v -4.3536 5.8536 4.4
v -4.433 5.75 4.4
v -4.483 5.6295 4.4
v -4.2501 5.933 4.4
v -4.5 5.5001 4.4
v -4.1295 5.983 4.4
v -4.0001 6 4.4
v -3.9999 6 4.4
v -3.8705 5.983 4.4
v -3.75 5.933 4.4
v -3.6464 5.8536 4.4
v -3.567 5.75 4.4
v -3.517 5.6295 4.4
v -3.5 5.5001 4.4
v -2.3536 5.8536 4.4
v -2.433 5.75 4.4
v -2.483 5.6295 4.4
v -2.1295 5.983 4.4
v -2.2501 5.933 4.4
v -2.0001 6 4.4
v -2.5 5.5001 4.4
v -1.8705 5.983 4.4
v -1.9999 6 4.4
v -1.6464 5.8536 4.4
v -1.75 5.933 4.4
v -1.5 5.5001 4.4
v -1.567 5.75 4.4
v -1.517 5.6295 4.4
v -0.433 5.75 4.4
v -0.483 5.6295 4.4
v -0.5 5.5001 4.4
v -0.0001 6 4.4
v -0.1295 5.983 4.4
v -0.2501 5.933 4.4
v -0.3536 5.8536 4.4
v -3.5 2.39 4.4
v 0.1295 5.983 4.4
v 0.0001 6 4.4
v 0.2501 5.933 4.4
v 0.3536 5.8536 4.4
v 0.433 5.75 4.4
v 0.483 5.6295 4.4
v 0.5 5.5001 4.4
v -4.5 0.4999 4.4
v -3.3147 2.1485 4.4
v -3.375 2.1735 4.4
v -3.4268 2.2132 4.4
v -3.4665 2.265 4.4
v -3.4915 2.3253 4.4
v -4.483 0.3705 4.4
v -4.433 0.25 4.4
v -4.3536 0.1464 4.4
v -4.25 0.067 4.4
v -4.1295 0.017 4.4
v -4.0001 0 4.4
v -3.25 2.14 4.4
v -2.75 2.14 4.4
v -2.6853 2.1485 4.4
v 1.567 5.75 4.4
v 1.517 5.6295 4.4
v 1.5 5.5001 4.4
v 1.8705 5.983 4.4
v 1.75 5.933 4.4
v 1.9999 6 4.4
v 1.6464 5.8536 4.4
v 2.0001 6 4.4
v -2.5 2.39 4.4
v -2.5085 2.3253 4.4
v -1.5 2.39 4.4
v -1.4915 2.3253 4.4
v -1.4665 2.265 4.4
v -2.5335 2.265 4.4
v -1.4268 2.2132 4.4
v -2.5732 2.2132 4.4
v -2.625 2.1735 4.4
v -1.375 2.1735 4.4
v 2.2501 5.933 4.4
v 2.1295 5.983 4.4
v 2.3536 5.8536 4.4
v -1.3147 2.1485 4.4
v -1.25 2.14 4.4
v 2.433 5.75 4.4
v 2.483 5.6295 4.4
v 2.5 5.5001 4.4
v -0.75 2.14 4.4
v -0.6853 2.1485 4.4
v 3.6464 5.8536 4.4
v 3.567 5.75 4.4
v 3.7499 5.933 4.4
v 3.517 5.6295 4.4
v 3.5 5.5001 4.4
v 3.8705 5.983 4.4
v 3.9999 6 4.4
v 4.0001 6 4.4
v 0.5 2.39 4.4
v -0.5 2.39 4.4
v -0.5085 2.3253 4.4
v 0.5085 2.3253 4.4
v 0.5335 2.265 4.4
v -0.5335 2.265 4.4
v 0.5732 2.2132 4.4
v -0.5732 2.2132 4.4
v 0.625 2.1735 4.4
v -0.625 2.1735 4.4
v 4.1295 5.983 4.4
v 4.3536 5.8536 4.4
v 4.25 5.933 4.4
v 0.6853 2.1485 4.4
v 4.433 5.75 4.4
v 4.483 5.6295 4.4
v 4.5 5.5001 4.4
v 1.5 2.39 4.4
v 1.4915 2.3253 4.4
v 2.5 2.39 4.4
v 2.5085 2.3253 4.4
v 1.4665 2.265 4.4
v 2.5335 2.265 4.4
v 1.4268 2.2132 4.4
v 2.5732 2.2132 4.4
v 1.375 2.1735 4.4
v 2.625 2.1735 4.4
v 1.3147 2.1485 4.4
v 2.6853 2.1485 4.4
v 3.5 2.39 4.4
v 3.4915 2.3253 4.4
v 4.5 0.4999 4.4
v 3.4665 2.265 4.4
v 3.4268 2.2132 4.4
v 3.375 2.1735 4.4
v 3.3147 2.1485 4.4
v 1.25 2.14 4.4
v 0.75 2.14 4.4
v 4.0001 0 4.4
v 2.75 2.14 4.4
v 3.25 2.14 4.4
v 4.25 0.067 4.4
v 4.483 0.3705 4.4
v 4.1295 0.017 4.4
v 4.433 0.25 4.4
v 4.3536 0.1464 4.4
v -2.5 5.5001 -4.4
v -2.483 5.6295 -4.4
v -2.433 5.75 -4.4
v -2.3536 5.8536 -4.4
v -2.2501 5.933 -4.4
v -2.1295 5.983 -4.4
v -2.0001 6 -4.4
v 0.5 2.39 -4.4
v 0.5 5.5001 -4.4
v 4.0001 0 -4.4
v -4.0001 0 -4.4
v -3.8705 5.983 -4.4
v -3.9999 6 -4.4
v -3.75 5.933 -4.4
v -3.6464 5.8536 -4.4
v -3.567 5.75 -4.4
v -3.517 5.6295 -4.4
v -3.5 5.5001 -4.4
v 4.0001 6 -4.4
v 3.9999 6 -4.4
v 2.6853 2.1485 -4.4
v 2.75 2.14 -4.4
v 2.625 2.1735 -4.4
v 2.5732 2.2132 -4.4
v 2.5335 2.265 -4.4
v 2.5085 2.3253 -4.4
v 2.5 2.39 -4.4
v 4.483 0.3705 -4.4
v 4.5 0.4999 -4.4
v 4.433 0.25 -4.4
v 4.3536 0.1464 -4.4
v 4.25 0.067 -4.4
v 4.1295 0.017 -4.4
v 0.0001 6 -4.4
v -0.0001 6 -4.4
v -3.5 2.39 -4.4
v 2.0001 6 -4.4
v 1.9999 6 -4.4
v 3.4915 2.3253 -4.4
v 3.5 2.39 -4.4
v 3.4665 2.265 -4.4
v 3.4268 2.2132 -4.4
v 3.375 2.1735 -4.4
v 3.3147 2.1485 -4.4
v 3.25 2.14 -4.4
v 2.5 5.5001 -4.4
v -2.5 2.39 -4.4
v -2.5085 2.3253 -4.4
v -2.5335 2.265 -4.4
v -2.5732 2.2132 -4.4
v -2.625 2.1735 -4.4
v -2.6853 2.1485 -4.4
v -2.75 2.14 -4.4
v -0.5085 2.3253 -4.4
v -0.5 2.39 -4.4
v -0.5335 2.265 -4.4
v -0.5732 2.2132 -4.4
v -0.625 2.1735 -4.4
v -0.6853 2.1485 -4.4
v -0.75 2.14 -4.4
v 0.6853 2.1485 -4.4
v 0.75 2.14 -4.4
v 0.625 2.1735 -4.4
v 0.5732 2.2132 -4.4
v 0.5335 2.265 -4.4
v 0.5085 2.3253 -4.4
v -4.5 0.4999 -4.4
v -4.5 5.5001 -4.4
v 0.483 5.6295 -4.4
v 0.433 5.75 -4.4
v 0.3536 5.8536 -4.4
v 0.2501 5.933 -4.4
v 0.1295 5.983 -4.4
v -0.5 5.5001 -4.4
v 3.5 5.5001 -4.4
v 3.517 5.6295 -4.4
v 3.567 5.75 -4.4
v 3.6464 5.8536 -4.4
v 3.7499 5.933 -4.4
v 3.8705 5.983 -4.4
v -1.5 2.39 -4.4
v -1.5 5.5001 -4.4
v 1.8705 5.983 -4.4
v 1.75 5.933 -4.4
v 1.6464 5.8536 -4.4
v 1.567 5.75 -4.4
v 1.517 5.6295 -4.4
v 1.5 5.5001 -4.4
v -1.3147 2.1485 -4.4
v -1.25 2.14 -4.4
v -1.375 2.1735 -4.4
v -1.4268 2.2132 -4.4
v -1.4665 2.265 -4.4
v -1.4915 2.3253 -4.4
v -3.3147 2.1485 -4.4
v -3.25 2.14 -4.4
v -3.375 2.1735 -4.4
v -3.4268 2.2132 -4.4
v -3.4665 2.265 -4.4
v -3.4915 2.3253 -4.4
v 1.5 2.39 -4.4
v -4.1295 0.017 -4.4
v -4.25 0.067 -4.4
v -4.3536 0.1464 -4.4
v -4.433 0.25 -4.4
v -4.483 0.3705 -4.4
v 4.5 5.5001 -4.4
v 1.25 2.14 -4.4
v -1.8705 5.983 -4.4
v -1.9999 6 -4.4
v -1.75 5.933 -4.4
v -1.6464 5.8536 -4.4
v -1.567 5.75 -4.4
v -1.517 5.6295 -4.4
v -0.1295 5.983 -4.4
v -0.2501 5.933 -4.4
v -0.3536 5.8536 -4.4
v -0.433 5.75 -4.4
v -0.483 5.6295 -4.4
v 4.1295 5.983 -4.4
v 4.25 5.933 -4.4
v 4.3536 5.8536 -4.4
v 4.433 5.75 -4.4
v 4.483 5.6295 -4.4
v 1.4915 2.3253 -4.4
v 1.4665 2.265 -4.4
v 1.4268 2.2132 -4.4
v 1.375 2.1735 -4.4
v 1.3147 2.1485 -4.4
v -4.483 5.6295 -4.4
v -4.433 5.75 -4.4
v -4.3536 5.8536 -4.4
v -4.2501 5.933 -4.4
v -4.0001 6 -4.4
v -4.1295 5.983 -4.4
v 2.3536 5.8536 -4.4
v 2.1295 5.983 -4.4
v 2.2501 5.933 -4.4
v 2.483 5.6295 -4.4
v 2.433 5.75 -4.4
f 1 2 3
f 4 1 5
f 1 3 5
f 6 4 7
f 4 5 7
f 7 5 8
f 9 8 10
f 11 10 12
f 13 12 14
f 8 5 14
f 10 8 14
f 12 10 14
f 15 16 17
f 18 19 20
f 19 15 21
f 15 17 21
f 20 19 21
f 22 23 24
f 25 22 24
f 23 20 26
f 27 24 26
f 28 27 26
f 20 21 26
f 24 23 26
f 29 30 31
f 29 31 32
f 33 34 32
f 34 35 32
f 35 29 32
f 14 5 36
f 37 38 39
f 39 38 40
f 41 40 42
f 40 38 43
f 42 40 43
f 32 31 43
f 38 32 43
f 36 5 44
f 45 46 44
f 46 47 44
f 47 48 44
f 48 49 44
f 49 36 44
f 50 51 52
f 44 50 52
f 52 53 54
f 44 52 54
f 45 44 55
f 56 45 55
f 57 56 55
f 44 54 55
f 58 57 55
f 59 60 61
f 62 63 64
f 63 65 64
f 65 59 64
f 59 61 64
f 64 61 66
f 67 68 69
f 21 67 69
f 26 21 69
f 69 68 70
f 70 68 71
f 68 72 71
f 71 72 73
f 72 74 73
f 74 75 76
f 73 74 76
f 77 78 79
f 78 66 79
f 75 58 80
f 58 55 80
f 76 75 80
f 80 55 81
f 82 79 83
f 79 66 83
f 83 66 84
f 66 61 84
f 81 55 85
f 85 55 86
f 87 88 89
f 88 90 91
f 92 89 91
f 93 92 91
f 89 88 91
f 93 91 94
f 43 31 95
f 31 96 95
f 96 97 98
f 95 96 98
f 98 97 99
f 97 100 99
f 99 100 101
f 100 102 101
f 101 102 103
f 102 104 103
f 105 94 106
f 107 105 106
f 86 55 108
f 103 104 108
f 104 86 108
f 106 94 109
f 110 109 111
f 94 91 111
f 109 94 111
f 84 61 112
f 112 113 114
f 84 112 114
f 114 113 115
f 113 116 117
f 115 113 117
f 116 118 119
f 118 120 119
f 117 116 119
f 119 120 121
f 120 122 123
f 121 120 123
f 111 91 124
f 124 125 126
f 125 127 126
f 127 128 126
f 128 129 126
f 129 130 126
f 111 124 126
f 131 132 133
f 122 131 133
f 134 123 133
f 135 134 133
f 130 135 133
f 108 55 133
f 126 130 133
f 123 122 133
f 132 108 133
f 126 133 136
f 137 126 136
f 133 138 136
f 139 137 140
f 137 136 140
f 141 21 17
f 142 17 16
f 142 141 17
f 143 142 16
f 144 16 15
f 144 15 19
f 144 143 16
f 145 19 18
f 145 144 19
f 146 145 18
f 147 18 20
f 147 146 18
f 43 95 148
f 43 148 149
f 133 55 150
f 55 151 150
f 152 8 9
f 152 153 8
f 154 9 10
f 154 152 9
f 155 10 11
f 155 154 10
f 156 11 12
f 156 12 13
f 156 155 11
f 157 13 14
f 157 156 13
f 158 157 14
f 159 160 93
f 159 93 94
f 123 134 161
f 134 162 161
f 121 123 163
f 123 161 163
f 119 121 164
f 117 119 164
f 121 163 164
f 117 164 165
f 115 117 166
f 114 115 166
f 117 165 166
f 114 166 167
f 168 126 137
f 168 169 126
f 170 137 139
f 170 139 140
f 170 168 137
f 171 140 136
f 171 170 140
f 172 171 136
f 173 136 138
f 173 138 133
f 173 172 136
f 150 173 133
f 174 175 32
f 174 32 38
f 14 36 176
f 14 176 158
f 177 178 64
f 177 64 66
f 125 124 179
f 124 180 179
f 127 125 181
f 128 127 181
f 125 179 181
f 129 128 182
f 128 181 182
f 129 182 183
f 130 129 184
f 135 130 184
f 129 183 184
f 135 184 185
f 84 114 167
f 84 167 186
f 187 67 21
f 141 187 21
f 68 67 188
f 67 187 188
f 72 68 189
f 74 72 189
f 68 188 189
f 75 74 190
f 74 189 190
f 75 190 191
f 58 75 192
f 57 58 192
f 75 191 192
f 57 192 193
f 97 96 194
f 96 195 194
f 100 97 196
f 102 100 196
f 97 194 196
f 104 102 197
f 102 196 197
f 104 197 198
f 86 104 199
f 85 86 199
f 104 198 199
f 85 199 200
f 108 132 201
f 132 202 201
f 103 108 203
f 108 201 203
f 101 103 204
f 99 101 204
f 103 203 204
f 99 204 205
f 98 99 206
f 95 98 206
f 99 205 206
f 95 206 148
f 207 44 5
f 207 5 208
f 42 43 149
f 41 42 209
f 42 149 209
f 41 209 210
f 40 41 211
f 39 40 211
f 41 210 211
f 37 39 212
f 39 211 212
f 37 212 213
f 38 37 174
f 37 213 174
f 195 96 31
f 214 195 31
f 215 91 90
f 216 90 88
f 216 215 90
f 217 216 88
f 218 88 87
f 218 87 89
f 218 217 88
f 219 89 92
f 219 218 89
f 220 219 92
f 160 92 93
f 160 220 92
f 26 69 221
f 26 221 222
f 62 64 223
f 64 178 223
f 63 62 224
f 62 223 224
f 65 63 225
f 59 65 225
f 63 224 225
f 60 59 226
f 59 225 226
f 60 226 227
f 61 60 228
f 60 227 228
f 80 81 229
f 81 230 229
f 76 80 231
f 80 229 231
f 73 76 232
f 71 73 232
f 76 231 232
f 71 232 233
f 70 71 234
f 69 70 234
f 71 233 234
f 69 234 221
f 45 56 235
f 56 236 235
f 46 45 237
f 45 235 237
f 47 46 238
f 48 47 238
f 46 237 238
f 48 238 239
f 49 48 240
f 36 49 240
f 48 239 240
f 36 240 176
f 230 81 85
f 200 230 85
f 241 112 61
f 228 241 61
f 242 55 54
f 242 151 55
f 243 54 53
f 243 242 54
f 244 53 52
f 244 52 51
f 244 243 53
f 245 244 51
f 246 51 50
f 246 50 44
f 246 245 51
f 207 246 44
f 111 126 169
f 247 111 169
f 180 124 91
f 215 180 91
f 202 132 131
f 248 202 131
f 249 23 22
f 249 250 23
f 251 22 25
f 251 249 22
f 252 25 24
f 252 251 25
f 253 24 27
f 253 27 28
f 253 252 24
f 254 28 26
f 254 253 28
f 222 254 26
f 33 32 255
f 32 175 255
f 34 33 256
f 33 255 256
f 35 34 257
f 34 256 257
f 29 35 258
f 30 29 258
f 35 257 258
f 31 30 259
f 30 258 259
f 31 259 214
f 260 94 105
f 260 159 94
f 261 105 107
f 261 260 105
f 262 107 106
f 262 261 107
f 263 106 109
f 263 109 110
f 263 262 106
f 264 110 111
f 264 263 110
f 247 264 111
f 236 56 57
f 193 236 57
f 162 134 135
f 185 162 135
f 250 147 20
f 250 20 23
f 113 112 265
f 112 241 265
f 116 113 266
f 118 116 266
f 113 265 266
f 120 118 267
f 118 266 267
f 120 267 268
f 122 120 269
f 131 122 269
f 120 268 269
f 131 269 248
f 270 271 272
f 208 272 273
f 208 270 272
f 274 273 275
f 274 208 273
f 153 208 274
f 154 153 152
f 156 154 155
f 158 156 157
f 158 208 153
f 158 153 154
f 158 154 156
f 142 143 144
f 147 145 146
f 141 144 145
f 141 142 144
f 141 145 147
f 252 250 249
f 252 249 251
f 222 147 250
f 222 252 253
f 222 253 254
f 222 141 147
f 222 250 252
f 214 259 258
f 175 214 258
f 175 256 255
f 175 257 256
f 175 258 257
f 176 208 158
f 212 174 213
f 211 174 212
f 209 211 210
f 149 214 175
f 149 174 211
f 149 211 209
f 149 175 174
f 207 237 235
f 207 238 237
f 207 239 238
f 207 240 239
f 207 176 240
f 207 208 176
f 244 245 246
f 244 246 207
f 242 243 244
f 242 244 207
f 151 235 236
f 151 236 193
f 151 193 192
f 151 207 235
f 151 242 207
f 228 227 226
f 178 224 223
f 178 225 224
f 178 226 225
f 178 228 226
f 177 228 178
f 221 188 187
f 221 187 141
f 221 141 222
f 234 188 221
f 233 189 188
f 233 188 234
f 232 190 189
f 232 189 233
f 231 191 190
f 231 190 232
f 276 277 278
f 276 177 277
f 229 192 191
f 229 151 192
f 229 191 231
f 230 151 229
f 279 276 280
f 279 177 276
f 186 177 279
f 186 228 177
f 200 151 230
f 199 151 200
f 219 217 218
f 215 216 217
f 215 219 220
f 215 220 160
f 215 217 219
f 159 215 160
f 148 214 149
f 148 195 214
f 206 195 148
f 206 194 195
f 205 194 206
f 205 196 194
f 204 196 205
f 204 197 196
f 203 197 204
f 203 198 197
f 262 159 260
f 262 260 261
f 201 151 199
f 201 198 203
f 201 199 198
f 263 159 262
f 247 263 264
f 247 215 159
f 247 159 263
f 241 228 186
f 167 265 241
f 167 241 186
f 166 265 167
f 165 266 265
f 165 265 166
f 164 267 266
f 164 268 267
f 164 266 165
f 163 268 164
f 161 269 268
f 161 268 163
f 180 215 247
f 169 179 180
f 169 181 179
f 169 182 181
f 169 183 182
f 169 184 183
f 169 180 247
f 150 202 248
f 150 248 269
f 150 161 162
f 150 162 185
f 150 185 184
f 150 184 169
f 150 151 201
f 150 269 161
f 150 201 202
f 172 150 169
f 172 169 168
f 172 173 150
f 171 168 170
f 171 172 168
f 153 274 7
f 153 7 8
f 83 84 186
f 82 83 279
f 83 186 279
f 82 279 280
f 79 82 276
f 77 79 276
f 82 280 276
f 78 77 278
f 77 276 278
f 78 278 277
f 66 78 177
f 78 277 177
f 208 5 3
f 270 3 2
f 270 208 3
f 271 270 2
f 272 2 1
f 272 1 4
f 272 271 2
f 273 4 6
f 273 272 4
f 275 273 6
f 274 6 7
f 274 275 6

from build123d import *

# Parameters (mm, degrees)
SKETCH1_W           = 9
SKETCH1_H           = 8.8
BOSS_EXTRUDE1_DEPTH = 6
SKETCH2_W           = 1
SKETCH2_H           = 3.86
CUT_EXTRUDE1_DEPTH  = 12.562439189
LPATTERN1_COUNT     = 4
LPATTERN1_PITCH     = 2
FILLET1_R           = 0.25
FILLET2_R           = 0.5


with BuildPart() as part:
    # Sketch1 → Boss-Extrude1 (new body)
    with BuildSketch(Plane(origin=(0, 0, 0), x_dir=(1, 0, 0), z_dir=(0, 1, 0))):
        Rectangle(SKETCH1_W, SKETCH1_H)
    extrude(amount=BOSS_EXTRUDE1_DEPTH)

    # Sketch2 → Cut-Extrude1 (cut, through all)
    with BuildSketch(Plane.XY.offset(4.4)):
        with Locations((-3, 4.07)):
            Rectangle(SKETCH2_W, SKETCH2_H)
    cut_extrude1 = extrude(amount=-CUT_EXTRUDE1_DEPTH, mode=Mode.SUBTRACT)

    # LPattern1: Cut-Extrude1 ×4
    with Locations(*[(i * LPATTERN1_PITCH, 0, 0) for i in range(1, LPATTERN1_COUNT)]):
        add(cut_extrude1, mode=Mode.SUBTRACT)

    # Fillet1
    fillet1_edges = [part.edges().sort_by_distance(p)[0] for p in [
        (-2.5, 2.14, 0),
        (-3.5, 2.14, 0),
        (-0.5, 2.14, 0),
        (-1.5, 2.14, 0),
        (1.5, 2.14, 0),
        (0.5, 2.14, 0),
        (3.5, 2.14, 0),
        (2.5, 2.14, 0),
    ]]
    fillet(fillet1_edges, radius=FILLET1_R)

    # Fillet2
    fillet2_edges = [part.edges().sort_by_distance(p)[0] for p in [
        (-4.5, 6, 0),
        (-3.5, 6, 0),
        (-2.5, 6, 0),
        (-1.5, 6, 0),
        (-0.5, 6, 0),
        (0.5, 6, 0),
        (1.5, 6, 0),
        (2.5, 6, 0),
        (3.5, 6, 0),
        (4.5, 6, 0),
        (-4.5, 0, 0),
        (4.5, 0, 0),
    ]]
    fillet(fillet2_edges, radius=FILLET2_R - 0.0001)  # a hair under: the kernel refuses the full size


solid = part.part
